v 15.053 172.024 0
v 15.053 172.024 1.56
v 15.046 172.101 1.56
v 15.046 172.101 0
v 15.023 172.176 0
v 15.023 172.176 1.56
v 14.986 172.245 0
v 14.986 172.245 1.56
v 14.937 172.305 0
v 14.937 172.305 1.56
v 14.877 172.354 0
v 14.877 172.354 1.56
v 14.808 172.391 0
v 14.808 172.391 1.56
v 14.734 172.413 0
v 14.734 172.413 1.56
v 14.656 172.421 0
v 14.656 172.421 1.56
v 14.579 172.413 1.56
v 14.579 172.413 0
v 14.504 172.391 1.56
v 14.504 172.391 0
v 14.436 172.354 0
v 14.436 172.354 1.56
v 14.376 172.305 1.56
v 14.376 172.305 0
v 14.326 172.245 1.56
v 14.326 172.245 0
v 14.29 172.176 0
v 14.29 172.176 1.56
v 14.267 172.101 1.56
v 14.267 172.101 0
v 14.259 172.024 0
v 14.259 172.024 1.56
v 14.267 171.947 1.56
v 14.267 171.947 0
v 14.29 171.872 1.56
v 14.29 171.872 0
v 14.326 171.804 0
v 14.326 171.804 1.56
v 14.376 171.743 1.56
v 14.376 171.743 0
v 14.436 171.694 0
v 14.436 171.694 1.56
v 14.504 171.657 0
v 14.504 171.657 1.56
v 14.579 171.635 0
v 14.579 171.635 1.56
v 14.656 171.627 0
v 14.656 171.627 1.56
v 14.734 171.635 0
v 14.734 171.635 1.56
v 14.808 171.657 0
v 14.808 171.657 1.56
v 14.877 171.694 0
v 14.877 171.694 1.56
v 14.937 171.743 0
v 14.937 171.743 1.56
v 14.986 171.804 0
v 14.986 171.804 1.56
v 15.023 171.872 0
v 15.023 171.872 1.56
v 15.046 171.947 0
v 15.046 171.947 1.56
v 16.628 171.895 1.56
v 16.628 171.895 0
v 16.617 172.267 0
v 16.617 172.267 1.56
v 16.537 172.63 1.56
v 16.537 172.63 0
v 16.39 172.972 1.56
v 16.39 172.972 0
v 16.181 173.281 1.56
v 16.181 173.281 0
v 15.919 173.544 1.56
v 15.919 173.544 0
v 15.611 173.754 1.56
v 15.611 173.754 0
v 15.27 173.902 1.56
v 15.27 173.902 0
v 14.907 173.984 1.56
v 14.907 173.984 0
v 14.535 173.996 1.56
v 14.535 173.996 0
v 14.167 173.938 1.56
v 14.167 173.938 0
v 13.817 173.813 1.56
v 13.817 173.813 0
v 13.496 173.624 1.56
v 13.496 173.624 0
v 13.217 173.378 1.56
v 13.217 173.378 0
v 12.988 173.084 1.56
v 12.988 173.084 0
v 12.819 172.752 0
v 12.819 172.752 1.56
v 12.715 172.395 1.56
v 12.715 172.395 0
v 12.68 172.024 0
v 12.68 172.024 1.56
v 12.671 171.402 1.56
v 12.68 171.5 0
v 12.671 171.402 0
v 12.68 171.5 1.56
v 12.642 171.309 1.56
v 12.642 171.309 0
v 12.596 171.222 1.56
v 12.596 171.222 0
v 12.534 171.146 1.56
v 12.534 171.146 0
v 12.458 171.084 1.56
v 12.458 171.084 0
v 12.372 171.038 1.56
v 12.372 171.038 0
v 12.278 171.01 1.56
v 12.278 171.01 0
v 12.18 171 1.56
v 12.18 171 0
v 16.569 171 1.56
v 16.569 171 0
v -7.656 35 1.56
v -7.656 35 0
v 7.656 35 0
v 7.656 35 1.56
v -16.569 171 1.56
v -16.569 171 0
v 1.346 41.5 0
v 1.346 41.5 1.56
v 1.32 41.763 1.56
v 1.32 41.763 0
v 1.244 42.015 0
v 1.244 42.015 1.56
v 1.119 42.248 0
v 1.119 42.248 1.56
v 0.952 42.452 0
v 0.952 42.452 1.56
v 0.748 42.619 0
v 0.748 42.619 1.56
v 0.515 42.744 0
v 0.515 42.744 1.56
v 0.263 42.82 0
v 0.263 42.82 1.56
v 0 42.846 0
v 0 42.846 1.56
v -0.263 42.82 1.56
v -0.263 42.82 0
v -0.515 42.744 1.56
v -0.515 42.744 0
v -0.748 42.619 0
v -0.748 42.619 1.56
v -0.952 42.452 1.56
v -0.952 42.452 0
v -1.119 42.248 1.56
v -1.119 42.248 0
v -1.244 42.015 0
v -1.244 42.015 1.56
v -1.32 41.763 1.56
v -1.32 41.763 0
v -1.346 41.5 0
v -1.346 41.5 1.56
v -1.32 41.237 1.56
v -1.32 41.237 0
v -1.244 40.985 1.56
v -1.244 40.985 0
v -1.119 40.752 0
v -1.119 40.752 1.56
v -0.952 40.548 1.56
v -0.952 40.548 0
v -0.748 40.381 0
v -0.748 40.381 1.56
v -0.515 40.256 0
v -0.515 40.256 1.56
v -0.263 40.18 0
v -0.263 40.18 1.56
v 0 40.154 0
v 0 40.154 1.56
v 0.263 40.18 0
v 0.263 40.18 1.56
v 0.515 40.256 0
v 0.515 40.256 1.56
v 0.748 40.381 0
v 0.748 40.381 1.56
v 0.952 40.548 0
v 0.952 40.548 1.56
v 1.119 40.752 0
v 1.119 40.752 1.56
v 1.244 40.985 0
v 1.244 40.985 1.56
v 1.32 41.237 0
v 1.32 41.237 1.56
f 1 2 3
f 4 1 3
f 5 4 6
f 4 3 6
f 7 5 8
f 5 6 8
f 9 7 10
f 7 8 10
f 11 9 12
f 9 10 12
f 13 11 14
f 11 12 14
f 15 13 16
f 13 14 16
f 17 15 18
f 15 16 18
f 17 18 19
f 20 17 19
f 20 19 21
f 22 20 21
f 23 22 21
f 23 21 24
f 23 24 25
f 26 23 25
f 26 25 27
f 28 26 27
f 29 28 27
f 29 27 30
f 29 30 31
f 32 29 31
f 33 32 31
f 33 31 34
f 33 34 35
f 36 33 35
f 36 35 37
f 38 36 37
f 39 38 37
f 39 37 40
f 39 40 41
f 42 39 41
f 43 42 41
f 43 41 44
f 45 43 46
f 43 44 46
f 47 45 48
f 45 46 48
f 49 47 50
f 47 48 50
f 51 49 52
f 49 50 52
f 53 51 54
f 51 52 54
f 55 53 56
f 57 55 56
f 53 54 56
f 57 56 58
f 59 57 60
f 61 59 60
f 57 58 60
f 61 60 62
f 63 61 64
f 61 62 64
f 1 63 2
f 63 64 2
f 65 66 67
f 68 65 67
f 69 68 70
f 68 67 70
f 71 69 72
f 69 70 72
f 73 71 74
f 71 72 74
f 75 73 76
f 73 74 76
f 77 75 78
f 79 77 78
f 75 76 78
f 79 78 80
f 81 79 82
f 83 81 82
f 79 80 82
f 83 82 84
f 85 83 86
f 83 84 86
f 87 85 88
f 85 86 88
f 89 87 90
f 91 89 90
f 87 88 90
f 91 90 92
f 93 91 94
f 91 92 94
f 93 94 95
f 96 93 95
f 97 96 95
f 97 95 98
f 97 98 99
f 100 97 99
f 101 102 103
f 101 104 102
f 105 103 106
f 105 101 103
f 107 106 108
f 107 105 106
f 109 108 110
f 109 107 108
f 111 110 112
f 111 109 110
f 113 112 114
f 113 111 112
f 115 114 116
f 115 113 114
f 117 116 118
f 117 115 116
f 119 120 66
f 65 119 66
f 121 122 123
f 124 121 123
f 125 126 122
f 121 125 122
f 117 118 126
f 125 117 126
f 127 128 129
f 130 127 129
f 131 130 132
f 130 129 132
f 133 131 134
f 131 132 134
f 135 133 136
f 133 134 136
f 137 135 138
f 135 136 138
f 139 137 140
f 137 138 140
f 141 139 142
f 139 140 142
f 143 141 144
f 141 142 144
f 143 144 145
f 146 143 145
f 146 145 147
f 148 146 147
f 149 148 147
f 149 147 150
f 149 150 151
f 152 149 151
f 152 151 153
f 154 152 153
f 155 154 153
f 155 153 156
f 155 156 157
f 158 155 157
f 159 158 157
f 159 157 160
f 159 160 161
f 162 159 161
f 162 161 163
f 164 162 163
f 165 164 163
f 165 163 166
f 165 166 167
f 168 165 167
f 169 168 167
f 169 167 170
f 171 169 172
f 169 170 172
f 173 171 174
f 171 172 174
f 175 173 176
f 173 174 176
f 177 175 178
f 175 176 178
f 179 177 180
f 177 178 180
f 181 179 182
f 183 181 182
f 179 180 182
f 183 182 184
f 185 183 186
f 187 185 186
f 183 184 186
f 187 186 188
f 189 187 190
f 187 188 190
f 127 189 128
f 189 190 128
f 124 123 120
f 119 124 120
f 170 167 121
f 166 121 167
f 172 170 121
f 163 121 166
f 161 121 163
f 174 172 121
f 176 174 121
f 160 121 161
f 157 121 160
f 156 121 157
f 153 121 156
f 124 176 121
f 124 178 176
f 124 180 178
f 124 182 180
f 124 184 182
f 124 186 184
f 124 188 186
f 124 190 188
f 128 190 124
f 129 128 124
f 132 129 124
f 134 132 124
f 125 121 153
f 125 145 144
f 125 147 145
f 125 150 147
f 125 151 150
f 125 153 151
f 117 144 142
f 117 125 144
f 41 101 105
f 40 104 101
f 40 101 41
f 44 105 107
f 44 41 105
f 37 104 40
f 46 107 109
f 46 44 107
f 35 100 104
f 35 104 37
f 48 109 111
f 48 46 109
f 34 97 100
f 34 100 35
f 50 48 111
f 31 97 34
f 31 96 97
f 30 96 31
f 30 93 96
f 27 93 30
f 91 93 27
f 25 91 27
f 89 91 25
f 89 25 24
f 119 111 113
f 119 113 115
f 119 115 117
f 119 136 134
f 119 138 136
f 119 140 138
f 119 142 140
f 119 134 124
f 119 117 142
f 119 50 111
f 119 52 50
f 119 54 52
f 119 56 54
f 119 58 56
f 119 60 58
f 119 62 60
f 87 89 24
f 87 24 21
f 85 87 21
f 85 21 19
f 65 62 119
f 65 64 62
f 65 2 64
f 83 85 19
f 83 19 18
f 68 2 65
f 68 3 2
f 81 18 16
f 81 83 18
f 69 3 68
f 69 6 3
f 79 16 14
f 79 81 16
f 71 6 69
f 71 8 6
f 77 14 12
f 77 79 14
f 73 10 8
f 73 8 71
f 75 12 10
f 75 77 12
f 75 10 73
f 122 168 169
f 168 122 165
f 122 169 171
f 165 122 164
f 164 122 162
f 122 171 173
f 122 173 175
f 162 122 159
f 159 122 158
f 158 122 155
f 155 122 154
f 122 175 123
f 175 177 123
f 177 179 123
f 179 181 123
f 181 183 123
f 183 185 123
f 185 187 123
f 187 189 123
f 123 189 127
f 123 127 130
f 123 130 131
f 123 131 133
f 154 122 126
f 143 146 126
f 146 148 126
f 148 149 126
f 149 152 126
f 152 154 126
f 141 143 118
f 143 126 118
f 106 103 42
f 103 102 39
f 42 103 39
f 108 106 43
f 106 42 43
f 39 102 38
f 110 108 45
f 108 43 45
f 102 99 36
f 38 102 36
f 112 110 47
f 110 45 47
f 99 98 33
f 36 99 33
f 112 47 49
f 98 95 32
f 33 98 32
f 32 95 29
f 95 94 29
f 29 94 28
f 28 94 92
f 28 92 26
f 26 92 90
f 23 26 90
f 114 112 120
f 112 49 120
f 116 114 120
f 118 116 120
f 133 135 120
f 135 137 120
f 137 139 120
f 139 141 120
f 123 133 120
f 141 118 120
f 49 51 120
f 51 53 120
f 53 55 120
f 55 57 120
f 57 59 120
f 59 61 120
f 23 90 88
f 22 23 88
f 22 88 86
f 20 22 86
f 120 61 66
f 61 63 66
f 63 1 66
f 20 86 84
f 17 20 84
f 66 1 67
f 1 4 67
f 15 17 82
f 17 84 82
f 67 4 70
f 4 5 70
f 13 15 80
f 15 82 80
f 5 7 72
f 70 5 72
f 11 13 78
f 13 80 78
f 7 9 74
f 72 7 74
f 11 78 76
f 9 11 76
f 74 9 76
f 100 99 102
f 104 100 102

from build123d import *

# Parameters (mm, degrees)
EXTRUDE1_DEPTH     = 1.56
SKETCH2_R          = 1.3462
CUT_EXTRUDE2_DEPTH = 2.56
EXTRUDE2_DEPTH     = 1.56
FILLET1_R          = 0.5
SKETCH5_R          = 0.396875
EXTRUDE3_DEPTH     = 2.56


with BuildPart() as part:
    # Sketch1 → Extrude1 (new body)
    with BuildSketch(Plane.XY):
        Polygon((-7.655500537, 35), (7.655500537, 35), (16.56941148, 171), (-16.56941148, 171), align=None)
    extrude(amount=EXTRUDE1_DEPTH)

    # Sketch2 → Cut-Extrude2 (cut, through all)
    with BuildSketch(Plane(origin=(2.513247729, -24.95744912, 1.56), x_dir=(1, 0, 0), z_dir=(0, 0, 1))):
        with Locations((-2.513247729, 66.45744912)):
            Circle(SKETCH2_R)
    extrude(amount=-CUT_EXTRUDE2_DEPTH, mode=Mode.SUBTRACT)

    # Sketch4 → Extrude2 (add)
    with BuildSketch(Plane(origin=(0, 0, 0), x_dir=(-1, 0, 0), z_dir=(0, 0, -1))):
        with BuildLine():
            Line((-16.56941148, 171), (-16.628059301, 171.894792828))
            ThreePointArc((-16.628059301, 171.894792828), (-14.720969619, 173.99894204), (-12.68034522, 172.024027605))
            Line((-12.68034522, 172.024027605), (-12.68034522, 171))
            Line((-12.68034522, 171), (-16.56941148, 171))
        make_face()
    extrude(amount=-EXTRUDE2_DEPTH)

    # Fillet1
    fillet1_edges = [part.edges().sort_by_distance(p)[0] for p in [
        (12.68034522, 171, 0.78),
    ]]
    fillet(fillet1_edges, radius=FILLET1_R)

    # Sketch5 → Extrude3 (cut, through all)
    with BuildSketch(Plane.XY.offset(1.56)):
        with Locations((14.656317615, 172.024027605)):
            Circle(SKETCH5_R)
    extrude(amount=-EXTRUDE3_DEPTH, mode=Mode.SUBTRACT)


solid = part.part
